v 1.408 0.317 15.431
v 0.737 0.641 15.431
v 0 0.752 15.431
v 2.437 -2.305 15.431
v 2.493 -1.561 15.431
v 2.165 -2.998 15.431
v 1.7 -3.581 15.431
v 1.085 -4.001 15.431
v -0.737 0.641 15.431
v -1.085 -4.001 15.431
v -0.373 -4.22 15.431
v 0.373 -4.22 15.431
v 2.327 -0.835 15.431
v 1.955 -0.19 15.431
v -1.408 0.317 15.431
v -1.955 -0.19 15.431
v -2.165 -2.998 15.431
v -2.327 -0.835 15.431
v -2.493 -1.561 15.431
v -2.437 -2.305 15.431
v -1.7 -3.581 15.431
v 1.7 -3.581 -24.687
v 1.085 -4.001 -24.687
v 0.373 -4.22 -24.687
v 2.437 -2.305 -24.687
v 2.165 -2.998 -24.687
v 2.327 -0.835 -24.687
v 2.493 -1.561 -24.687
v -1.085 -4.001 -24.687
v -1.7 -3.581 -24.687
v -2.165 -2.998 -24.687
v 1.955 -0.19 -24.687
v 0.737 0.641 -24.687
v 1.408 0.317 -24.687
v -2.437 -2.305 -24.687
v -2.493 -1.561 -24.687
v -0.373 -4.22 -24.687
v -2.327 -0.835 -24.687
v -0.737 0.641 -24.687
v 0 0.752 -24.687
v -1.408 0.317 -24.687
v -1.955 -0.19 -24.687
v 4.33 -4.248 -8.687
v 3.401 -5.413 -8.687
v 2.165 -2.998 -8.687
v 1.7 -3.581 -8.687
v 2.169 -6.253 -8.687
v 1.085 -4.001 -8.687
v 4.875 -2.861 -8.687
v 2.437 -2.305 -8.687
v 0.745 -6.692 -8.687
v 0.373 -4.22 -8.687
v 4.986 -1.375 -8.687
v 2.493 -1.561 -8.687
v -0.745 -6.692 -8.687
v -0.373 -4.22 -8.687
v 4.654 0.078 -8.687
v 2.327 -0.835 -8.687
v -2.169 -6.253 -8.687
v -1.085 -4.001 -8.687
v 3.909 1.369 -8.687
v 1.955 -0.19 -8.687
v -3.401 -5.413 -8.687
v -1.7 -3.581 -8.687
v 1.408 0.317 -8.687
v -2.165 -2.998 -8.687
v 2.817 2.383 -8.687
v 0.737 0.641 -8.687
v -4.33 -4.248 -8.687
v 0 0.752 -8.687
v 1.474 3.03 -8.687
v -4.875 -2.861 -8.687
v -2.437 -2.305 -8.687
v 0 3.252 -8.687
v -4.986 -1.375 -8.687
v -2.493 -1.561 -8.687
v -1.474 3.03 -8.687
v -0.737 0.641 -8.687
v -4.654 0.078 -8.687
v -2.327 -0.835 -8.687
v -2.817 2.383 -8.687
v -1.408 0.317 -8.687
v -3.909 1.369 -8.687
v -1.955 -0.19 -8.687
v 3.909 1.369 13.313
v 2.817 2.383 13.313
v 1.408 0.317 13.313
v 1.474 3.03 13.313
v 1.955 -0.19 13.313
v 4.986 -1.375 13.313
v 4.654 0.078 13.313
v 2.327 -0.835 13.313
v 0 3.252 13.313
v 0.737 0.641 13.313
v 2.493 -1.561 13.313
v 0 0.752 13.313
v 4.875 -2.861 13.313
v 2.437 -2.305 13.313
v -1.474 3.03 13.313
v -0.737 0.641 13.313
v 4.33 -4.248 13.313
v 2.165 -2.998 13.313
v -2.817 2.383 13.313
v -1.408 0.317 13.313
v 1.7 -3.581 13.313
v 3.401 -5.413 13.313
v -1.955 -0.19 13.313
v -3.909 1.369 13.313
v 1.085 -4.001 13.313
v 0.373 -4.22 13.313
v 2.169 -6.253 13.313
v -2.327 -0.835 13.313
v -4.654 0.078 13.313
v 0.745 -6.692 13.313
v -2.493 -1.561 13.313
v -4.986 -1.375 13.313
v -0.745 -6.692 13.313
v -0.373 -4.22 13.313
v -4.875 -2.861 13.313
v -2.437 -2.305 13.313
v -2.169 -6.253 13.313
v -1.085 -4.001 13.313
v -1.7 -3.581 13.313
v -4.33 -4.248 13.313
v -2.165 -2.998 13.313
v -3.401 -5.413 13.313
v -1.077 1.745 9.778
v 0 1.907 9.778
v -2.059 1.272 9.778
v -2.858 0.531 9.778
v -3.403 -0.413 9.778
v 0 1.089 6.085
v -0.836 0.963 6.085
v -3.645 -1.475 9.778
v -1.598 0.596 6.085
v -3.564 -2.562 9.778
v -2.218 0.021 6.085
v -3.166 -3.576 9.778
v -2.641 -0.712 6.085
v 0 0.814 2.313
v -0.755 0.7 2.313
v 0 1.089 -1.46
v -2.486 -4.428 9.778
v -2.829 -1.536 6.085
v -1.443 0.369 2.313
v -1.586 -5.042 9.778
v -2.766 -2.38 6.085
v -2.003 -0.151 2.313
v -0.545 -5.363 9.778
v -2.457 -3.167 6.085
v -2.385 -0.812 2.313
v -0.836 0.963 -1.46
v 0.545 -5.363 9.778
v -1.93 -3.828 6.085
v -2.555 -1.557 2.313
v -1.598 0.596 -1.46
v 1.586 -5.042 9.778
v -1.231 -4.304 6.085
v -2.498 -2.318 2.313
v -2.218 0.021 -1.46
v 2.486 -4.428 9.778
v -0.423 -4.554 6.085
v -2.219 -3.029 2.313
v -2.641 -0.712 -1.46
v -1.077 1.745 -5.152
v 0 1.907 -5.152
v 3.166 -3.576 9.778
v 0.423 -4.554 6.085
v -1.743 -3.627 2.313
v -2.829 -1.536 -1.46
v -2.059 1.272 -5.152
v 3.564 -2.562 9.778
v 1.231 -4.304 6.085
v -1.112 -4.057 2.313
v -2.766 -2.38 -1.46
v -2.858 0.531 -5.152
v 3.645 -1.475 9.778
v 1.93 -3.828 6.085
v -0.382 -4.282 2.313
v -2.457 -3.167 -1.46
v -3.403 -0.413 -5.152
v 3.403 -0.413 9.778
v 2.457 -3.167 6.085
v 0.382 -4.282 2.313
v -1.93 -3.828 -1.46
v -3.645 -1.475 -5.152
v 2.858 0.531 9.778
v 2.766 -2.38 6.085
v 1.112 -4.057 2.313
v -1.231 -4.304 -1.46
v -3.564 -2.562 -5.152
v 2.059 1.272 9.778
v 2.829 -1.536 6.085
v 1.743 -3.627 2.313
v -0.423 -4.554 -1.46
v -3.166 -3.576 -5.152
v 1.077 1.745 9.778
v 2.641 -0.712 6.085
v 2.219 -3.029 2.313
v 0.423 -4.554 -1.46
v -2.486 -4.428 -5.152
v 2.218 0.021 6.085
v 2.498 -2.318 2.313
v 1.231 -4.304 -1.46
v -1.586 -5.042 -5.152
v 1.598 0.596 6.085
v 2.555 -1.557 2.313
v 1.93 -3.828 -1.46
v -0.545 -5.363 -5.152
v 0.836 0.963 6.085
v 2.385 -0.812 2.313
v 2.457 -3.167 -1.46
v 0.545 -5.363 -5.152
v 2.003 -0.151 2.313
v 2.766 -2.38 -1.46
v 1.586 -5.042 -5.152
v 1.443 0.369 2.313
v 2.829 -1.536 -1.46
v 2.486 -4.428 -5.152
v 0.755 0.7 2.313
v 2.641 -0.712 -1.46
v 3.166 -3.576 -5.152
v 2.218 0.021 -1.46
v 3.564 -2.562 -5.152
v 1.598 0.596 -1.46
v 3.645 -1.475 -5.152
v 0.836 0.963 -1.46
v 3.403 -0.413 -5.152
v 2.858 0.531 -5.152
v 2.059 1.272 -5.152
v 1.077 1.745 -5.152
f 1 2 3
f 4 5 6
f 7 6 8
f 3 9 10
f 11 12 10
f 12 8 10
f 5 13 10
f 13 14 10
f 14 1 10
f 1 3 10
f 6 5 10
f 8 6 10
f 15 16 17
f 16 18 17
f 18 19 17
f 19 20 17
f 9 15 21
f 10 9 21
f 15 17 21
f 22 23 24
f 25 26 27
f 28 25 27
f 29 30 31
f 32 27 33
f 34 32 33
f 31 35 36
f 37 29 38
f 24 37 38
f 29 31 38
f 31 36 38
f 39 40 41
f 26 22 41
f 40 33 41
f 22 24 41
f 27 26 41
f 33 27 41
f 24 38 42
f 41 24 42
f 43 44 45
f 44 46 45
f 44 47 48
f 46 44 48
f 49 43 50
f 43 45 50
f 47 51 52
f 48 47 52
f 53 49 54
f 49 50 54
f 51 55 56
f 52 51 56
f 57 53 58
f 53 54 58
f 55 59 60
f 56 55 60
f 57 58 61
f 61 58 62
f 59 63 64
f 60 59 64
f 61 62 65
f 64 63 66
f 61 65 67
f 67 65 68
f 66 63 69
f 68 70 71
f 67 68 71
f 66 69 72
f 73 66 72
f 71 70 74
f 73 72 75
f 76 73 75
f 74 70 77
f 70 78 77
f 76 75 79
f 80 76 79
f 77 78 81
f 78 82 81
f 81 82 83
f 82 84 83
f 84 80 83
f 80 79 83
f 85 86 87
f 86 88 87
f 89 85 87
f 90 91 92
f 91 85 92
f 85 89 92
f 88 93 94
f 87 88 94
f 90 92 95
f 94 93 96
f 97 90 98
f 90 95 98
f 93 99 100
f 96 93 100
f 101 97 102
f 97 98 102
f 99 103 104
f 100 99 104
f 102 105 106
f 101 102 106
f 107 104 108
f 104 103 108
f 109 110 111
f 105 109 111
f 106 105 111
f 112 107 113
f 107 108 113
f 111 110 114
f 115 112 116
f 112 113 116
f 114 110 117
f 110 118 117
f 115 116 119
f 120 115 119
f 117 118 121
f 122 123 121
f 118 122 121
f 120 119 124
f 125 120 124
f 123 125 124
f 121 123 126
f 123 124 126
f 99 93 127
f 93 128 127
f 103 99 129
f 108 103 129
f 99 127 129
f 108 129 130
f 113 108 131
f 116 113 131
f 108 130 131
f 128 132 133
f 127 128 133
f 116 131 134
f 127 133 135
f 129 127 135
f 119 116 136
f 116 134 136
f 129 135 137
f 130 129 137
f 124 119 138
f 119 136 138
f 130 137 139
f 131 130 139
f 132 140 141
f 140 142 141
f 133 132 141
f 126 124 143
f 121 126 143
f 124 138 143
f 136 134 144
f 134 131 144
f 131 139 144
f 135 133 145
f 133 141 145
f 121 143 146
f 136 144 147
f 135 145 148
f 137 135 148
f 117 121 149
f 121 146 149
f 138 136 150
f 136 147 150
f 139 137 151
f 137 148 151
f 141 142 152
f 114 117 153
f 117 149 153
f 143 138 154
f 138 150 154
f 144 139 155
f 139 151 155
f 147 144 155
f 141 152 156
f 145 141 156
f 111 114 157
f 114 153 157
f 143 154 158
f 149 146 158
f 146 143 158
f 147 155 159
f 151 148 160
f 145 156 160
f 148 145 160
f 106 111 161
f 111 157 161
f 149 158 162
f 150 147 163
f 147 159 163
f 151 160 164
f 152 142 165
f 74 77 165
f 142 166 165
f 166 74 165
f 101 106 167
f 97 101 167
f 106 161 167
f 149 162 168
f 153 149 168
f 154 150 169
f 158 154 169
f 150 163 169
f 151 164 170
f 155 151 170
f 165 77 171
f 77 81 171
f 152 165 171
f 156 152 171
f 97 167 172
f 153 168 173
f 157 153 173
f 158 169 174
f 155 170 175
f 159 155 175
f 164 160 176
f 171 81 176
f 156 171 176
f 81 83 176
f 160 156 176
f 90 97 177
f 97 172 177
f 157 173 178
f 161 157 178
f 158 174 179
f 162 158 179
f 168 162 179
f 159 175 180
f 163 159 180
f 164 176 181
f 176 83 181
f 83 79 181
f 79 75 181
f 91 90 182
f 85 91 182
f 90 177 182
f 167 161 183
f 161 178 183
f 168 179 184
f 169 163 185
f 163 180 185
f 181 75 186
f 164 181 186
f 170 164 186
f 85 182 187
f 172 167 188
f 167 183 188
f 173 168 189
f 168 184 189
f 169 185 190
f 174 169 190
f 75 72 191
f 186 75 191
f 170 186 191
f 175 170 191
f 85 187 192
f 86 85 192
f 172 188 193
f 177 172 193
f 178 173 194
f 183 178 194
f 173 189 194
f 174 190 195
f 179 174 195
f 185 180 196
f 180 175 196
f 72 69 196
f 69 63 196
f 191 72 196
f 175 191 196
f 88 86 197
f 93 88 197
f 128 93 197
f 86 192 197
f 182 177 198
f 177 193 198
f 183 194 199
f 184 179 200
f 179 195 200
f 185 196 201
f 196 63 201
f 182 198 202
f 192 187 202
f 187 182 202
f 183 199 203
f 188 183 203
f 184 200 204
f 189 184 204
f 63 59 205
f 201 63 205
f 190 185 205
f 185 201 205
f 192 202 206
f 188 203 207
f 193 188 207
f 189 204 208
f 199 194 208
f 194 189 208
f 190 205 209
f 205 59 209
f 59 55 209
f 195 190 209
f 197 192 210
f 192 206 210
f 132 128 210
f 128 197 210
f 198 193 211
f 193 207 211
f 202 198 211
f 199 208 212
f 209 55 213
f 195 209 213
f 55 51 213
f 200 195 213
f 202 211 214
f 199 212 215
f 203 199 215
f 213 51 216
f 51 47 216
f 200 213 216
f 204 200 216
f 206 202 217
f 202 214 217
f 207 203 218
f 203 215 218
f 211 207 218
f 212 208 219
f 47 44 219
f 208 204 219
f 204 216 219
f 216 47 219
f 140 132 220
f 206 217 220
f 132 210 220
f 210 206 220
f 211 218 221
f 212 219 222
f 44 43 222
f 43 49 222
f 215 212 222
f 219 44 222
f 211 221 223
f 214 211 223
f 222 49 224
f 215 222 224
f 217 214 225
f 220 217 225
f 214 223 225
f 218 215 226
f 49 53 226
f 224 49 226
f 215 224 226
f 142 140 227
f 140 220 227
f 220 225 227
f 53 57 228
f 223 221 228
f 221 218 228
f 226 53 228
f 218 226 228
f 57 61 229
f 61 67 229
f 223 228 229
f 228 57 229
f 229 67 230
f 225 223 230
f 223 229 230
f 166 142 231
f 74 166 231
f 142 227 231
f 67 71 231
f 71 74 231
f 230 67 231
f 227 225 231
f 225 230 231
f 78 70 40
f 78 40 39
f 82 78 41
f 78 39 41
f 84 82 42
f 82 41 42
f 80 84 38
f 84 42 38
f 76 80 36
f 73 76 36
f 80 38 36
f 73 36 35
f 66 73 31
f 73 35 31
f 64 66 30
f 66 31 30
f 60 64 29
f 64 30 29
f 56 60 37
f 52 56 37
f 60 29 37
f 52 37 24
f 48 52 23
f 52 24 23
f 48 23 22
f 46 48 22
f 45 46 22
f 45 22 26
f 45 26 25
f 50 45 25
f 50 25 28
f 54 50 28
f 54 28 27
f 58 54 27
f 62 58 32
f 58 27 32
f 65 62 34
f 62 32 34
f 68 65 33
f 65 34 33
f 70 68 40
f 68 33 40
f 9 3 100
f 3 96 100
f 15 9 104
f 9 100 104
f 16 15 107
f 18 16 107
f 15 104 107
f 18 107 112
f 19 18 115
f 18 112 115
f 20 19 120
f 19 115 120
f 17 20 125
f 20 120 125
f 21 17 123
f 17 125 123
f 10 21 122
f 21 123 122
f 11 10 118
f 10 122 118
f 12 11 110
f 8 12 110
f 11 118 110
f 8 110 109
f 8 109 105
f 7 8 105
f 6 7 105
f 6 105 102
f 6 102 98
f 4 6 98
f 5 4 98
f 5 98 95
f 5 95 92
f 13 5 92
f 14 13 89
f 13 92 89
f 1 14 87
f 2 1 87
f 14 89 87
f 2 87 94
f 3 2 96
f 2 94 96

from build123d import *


with BuildPart() as part:
    # Szkic1 → Obrót1 (revolve)
    with BuildSketch(Plane(origin=(0, 0, 0), x_dir=(0, 0, -1), z_dir=(1, 0, 0))):
        with BuildLine():
            Line((24.687298198, -1.748229667), (-13.312701802, -1.748229667))
            Line((-13.312701802, -1.748229667), (-15.431171619, -1.748229667))
            Line((-15.431171619, -1.748229667), (-15.431171619, 0.751770333))
            Line((-15.431171619, 0.751770333), (-13.312701802, 0.751770333))
            Line((-13.312701802, 0.751770333), (-13.312701802, 3.251770333))
            ThreePointArc((-13.312701802, 3.251770333), (-2.312701802, 0.814239523), (8.687298198, 3.251770333))
            Line((8.687298198, 3.251770333), (8.687298198, 0.751770333))
            Line((8.687298198, 0.751770333), (24.687298198, 0.751770333))
            Line((24.687298198, 0.751770333), (24.687298198, -1.748229667))
        make_face()
    revolve(axis=Axis((0, -1.748229667, -24.687298198), (0, 0, 1)))


solid = part.part
